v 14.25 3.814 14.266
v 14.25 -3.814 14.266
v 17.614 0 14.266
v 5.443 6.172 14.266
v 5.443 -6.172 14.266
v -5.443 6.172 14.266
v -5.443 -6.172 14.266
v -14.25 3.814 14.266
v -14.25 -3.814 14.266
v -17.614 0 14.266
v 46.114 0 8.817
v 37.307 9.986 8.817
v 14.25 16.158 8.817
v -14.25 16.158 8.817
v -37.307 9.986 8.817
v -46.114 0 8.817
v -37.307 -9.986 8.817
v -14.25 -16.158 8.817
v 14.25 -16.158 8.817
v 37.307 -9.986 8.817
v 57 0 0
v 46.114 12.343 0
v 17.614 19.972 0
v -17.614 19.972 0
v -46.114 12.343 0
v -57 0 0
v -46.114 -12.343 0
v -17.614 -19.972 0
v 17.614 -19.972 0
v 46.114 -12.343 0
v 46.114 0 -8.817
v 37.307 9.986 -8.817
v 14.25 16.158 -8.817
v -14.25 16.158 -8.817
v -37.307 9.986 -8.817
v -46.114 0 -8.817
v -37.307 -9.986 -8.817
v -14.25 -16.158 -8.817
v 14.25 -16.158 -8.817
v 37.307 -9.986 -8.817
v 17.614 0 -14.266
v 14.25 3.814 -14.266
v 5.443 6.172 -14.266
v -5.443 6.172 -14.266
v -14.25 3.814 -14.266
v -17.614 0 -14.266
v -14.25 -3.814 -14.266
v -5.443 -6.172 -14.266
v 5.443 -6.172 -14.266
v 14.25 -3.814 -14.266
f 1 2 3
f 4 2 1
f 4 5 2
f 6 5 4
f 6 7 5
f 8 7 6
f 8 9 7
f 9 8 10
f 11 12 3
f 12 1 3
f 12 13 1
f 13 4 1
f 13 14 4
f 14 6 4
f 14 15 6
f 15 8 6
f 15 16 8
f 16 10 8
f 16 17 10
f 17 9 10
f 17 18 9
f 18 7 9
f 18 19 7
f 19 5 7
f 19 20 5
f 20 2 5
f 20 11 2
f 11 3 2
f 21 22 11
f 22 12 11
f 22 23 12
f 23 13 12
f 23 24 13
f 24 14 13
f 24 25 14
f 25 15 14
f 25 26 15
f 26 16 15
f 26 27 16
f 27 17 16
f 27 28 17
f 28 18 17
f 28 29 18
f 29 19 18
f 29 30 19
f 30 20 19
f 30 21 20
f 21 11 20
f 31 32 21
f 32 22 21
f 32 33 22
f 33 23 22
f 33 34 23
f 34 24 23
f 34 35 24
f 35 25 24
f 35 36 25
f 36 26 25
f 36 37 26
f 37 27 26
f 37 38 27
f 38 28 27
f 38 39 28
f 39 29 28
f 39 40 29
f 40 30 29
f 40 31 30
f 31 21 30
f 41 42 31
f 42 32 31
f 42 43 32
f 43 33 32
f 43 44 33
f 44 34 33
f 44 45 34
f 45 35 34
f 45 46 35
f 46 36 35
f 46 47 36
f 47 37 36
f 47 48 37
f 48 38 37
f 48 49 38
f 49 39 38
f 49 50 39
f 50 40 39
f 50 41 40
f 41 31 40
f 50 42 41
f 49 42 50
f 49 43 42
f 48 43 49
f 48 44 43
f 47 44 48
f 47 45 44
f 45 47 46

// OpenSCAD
// Generated by SolidPython 1.0.1 on 2020-07-29 00:46:53


scale(v = [19, 7, 5]) {
	sphere(r = 3);
}
/***********************************************
*********      SolidPython code:      **********
************************************************
 
# import packages: SolidPython
from solid import *
from solid.utils import *
from itertools import chain, combinations, permutations


class Resize:

    def __init__(self, scad_file):
        self.scad_file = scad_file
        #self.scad_file = import_scad(scad_file)
        # cone/cylinder param:
        self.r1 = 0
        self.r2 = 0
        self.h = 0
        # rectangular prism param:
        self.w = 0
        self.l = 0
        # ellipse param:
        self.r = 0

    # import OpenScad code (file name corresponds to shape)


    # classify shape + parameters
    def assign(self, param1, param2, param3):
        if self.scad_file == 'cone.scad':
            self.r1 = param1
            self.r2 = param2
            self.h = param3
        elif self.scad_file == 'cylinder.scad':
            self.r1 = param1
            self.r2 = param2
            self.h = param3
        elif self.scad_file == 'rectangularPrism.scad':
            self.h = param1
            self.l = param2
            self.w = param3
        else:
            self.r = param1
            self.h = param2

    # resize parameters
    def iterate(self):
        x = range(3, 20, 2)
        i = 1
        if self.scad_file == 'cone.scad':
            tempList = list(permutations(x, 2))
            for temp in tempList:
                param1 = temp[0]
                param2 = temp[1]
                filepath = 'produced_scad_files/' + 'cone' + str(param1) + '_' + str(param2) + '_' + '.scad'
                scad_render_to_file(cylinder(h=param1, r1=param2, r2=0), filepath)

        elif self.scad_file == 'cylinder.scad':
            tempList = list(permutations(x, 3))
            for temp in tempList:
                param1 = temp[0]
                param2 = temp[1]
                filepath = 'produced_scad_files/' + 'cylinder' + str(param1) + '_' + str(param2) + '_' + '.scad'
                scad_render_to_file(cylinder(h=param1, r1=param2, r2=param2), filepath)

        elif self.scad_file == 'rectangularPrism.scad':
            tempList = list(permutations(x, 3))
            for temp in tempList:
                param1 = temp[0]
                param2 = temp[1]
                param3 = temp[2]
                filepath = 'produced_scad_files/' + 'rectangularPrism' + str(param1) + '_' + str(param2) + '_' + str(
                    param3) + '.scad'
                scad_render_to_file(cube(size=(param1, param2, param3)), filepath)

        elif self.scad_file == 'ellipse.scad':
            tempList = list(permutations(x, 4))
            for temp in tempList:
                param1 = temp[0]
                param2 = temp[1]
                param3 = temp[2]
                param4 = temp[3]
                filepath = 'produced_scad_files/' + 'ellipse' + str(param1) + '_' + str(param2) + '_' + str(param3) + '_' + str(param4) + '.scad'
                scad_render_to_file(scale([param1, param2, param3])(sphere(r=param4)), filepath)

    def render_to_scadfile(self):
        scad_render_to_file(scad, 'example.scad') 
 
************************************************/
